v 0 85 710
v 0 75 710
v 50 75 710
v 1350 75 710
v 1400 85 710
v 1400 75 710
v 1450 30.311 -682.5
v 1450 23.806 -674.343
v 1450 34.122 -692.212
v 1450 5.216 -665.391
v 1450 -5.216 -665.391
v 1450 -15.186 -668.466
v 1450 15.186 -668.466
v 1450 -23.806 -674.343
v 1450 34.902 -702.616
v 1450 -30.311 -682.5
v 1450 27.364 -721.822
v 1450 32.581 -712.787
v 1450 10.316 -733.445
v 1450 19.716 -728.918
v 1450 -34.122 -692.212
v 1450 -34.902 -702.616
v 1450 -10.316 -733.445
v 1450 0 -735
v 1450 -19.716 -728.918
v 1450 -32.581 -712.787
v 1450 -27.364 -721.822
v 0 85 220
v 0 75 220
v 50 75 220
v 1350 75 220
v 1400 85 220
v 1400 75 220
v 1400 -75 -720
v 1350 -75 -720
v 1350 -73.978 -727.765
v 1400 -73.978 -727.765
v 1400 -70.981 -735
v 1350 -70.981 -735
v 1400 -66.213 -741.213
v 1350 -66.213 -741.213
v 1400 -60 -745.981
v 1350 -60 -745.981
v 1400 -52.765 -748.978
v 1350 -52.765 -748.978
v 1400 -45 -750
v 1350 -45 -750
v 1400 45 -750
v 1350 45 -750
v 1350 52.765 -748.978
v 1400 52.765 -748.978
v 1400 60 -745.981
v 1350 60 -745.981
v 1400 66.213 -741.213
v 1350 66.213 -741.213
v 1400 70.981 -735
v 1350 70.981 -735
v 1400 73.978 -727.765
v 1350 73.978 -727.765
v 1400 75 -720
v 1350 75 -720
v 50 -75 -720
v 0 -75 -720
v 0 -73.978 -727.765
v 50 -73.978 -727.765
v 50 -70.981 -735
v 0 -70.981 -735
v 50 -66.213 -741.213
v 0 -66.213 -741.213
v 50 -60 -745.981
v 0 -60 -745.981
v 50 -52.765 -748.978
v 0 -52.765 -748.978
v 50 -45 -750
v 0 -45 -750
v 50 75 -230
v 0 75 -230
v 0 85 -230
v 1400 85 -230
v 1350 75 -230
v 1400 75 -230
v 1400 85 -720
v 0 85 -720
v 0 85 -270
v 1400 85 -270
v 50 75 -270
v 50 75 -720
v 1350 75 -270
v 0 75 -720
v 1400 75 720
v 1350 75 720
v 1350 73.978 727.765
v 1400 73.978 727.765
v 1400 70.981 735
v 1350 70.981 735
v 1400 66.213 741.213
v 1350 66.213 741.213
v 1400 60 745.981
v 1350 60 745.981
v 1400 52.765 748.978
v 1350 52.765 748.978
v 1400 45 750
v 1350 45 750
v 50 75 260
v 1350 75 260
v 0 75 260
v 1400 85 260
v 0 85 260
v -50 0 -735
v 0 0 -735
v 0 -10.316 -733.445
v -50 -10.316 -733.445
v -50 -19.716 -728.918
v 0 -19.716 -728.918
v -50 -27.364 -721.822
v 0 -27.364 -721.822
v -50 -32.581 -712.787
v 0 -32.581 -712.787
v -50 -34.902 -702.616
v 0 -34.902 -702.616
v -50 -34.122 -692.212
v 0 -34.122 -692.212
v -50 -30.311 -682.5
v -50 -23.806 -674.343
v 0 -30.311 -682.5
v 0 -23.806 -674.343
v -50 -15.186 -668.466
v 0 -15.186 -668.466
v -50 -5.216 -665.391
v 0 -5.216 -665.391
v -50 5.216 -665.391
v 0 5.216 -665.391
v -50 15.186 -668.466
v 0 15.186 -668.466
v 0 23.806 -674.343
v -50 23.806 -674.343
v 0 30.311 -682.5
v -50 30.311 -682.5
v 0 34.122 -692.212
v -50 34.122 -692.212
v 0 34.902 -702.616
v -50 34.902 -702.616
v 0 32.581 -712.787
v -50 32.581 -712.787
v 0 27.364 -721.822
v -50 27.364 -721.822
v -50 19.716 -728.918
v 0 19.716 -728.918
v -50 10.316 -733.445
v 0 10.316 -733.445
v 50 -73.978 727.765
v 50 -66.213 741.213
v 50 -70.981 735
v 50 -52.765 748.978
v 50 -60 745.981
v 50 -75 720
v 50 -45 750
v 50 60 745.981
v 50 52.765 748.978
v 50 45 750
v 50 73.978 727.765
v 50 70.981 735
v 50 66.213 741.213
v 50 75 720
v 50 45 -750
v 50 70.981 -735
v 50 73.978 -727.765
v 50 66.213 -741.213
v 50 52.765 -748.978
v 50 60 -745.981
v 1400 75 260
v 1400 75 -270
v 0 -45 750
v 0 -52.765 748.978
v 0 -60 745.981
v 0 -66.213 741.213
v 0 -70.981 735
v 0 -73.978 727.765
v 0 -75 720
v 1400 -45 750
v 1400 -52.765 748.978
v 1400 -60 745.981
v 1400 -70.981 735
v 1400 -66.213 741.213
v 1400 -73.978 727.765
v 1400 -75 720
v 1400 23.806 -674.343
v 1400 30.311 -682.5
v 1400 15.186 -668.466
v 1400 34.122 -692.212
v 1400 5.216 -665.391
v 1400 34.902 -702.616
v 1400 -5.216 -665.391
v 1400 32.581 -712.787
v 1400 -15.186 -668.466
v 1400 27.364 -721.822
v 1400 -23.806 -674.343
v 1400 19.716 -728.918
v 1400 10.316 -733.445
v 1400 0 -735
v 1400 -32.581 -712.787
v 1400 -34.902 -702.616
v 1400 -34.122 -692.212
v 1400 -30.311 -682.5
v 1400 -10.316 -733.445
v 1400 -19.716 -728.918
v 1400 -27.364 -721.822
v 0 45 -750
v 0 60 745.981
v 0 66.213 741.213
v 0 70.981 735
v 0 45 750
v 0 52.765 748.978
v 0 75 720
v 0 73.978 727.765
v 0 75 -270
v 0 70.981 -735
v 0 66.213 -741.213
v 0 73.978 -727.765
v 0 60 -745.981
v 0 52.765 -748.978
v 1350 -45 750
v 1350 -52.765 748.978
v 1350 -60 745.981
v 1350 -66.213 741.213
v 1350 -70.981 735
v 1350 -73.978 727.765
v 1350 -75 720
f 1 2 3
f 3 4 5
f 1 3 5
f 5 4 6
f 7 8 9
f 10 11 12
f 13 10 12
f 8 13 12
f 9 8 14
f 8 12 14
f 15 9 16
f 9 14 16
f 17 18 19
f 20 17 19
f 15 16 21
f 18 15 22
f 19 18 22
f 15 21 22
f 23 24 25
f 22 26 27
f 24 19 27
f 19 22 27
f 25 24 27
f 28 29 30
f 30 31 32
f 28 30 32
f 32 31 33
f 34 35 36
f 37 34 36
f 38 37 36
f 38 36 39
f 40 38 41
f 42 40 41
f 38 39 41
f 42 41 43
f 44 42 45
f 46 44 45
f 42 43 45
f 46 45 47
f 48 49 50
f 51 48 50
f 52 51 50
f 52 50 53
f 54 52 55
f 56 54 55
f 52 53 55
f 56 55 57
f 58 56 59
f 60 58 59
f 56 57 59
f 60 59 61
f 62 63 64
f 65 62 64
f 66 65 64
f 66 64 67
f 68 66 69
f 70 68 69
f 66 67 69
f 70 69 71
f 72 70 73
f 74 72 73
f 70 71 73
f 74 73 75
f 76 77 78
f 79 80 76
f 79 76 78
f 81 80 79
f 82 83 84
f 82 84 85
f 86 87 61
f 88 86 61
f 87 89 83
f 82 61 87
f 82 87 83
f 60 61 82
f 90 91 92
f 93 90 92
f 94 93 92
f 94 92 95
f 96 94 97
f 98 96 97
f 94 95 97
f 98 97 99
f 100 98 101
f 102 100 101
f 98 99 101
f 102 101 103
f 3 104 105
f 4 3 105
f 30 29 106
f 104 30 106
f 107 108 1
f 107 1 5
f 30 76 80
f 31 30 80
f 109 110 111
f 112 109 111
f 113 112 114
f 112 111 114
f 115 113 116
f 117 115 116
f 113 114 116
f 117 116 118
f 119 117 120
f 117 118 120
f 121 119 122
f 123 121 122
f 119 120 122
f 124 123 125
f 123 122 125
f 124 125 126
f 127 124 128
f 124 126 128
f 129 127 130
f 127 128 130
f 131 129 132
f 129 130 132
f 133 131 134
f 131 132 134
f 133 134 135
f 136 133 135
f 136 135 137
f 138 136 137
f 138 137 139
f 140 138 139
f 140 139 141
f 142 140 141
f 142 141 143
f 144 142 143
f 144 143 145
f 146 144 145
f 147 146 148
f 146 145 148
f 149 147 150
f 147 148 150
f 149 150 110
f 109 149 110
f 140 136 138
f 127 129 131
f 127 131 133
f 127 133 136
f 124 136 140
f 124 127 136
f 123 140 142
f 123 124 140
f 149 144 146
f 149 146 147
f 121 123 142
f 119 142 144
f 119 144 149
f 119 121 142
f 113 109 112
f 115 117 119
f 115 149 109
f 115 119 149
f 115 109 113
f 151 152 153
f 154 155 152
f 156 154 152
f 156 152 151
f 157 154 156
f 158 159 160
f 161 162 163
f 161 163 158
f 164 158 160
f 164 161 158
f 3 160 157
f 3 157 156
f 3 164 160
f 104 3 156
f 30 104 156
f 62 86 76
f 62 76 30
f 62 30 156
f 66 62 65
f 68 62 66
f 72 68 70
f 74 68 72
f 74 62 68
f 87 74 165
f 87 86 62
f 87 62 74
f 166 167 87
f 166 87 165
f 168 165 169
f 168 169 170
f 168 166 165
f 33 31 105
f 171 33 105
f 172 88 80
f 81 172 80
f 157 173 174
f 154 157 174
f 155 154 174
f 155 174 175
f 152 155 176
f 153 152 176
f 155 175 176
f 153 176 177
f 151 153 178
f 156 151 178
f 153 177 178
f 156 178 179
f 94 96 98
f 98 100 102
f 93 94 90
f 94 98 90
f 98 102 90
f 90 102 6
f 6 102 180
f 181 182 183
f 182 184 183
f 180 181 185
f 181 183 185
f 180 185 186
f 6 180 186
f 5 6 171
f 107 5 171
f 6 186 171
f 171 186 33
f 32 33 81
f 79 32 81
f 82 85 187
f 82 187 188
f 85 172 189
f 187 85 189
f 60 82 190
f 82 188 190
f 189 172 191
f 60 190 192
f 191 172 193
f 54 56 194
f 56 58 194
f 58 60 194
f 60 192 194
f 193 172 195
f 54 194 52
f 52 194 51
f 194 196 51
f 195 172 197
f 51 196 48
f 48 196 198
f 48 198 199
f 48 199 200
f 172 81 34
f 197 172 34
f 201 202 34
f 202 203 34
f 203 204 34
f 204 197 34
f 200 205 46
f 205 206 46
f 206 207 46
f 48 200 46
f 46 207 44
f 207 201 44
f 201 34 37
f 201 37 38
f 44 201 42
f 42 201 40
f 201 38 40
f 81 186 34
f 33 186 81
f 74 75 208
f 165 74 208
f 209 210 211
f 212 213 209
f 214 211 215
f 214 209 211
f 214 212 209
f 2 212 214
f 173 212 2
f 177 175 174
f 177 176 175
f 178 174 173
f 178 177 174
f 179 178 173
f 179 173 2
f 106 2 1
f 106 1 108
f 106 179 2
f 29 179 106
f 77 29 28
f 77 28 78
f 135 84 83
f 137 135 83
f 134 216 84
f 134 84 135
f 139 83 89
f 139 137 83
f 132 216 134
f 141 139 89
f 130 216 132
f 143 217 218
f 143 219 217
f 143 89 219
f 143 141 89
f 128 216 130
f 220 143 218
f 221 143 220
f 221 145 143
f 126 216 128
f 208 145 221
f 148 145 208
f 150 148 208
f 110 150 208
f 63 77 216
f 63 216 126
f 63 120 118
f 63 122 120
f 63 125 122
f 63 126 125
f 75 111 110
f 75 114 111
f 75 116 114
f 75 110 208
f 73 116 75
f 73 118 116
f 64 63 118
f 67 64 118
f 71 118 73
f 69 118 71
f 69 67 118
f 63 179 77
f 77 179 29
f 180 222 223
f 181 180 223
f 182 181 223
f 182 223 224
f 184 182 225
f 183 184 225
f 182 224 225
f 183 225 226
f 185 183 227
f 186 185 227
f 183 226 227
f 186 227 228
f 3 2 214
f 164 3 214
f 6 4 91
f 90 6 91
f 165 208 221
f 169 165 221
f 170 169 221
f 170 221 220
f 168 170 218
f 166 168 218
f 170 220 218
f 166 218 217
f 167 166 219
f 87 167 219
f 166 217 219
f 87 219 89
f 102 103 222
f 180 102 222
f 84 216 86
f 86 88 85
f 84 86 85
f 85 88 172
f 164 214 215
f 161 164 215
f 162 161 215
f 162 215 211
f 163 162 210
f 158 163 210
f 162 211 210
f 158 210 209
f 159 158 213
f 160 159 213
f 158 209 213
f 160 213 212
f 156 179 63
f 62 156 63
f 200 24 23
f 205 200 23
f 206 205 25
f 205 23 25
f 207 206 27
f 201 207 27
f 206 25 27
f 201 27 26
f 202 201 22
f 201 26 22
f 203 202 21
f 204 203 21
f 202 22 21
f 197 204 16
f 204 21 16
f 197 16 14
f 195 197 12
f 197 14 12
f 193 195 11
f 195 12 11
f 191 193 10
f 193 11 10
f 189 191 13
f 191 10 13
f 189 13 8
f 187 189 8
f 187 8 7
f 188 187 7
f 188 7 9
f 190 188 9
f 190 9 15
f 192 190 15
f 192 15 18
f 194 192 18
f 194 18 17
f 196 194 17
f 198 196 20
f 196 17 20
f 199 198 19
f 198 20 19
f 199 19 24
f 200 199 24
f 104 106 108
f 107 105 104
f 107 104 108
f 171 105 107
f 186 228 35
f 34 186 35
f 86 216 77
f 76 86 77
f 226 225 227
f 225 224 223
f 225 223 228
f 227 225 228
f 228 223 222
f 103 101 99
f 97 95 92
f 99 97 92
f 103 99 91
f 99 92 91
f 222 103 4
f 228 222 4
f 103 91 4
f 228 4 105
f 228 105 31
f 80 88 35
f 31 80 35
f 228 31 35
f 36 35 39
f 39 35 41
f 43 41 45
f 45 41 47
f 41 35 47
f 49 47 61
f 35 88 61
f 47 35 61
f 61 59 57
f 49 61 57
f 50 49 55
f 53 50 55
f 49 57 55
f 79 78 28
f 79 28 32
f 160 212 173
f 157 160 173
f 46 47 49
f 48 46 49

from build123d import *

# Parameters (mm, degrees)
BOSS_EXTRUDE1_DEPTH = 50
SKETCH2_W           = 1400
SKETCH2_H           = 450
BOSS_EXTRUDE2_DEPTH = 10
LPATTERN1_COUNT     = 2
LPATTERN1_PITCH     = 1350
LPATTERN2_COUNT     = 3
LPATTERN2_PITCH     = 490
SKETCH3_R           = 35
BOSS_EXTRUDE3_DEPTH = 50
LPATTERN3_COUNT     = 2
LPATTERN3_PITCH     = 1450


with BuildPart() as part:
    # Sketch1 → Boss-Extrude1 (new body)
    with BuildSketch(Plane(origin=(0, 0, 0), x_dir=(0, 0, -1), z_dir=(1, 0, 0))):
        with BuildLine():
            Line((-720, -75), (720, -75))
            ThreePointArc((720, -75), (741.213203436, -66.213203436), (750, -45))
            Line((750, -45), (750, 45))
            ThreePointArc((750, 45), (741.213203436, 66.213203436), (720, 75))
            Line((720, 75), (-720, 75))
            ThreePointArc((-720, 75), (-741.213203436, 66.213203436), (-750, 45))
            Line((-750, 45), (-750, -45))
            ThreePointArc((-750, -45), (-741.213203436, -66.213203436), (-720, -75))
        make_face()
    boss_extrude1 = extrude(amount=BOSS_EXTRUDE1_DEPTH)

    # Sketch2 → Boss-Extrude2 (add)
    with BuildSketch(Plane(origin=(0, 75, 0), x_dir=(1, 0, 0), z_dir=(0, 1, 0))):
        with Locations((700, 495)):
            Rectangle(SKETCH2_W, SKETCH2_H)
    boss_extrude2 = extrude(amount=BOSS_EXTRUDE2_DEPTH)

    # LPattern1: Boss-Extrude1 ×2
    with Locations(*[(i * LPATTERN1_PITCH, 0, 0) for i in range(1, LPATTERN1_COUNT)]):
        add(boss_extrude1)

    # LPattern2: Boss-Extrude2 ×3
    with Locations(*[(0, 0, i * LPATTERN2_PITCH) for i in range(1, LPATTERN2_COUNT)]):
        add(boss_extrude2)

    # Sketch3 → Boss-Extrude3 (add)
    with BuildSketch(Plane.ZY):
        with Locations(Location((-700, 0, 0), (0, 0, 180))):
            Circle(SKETCH3_R)
    boss_extrude3 = extrude(amount=BOSS_EXTRUDE3_DEPTH)

    # LPattern3: Boss-Extrude3 ×2
    with Locations(*[(i * LPATTERN3_PITCH, 0, 0) for i in range(1, LPATTERN3_COUNT)]):
        add(boss_extrude3)


solid = part.part
